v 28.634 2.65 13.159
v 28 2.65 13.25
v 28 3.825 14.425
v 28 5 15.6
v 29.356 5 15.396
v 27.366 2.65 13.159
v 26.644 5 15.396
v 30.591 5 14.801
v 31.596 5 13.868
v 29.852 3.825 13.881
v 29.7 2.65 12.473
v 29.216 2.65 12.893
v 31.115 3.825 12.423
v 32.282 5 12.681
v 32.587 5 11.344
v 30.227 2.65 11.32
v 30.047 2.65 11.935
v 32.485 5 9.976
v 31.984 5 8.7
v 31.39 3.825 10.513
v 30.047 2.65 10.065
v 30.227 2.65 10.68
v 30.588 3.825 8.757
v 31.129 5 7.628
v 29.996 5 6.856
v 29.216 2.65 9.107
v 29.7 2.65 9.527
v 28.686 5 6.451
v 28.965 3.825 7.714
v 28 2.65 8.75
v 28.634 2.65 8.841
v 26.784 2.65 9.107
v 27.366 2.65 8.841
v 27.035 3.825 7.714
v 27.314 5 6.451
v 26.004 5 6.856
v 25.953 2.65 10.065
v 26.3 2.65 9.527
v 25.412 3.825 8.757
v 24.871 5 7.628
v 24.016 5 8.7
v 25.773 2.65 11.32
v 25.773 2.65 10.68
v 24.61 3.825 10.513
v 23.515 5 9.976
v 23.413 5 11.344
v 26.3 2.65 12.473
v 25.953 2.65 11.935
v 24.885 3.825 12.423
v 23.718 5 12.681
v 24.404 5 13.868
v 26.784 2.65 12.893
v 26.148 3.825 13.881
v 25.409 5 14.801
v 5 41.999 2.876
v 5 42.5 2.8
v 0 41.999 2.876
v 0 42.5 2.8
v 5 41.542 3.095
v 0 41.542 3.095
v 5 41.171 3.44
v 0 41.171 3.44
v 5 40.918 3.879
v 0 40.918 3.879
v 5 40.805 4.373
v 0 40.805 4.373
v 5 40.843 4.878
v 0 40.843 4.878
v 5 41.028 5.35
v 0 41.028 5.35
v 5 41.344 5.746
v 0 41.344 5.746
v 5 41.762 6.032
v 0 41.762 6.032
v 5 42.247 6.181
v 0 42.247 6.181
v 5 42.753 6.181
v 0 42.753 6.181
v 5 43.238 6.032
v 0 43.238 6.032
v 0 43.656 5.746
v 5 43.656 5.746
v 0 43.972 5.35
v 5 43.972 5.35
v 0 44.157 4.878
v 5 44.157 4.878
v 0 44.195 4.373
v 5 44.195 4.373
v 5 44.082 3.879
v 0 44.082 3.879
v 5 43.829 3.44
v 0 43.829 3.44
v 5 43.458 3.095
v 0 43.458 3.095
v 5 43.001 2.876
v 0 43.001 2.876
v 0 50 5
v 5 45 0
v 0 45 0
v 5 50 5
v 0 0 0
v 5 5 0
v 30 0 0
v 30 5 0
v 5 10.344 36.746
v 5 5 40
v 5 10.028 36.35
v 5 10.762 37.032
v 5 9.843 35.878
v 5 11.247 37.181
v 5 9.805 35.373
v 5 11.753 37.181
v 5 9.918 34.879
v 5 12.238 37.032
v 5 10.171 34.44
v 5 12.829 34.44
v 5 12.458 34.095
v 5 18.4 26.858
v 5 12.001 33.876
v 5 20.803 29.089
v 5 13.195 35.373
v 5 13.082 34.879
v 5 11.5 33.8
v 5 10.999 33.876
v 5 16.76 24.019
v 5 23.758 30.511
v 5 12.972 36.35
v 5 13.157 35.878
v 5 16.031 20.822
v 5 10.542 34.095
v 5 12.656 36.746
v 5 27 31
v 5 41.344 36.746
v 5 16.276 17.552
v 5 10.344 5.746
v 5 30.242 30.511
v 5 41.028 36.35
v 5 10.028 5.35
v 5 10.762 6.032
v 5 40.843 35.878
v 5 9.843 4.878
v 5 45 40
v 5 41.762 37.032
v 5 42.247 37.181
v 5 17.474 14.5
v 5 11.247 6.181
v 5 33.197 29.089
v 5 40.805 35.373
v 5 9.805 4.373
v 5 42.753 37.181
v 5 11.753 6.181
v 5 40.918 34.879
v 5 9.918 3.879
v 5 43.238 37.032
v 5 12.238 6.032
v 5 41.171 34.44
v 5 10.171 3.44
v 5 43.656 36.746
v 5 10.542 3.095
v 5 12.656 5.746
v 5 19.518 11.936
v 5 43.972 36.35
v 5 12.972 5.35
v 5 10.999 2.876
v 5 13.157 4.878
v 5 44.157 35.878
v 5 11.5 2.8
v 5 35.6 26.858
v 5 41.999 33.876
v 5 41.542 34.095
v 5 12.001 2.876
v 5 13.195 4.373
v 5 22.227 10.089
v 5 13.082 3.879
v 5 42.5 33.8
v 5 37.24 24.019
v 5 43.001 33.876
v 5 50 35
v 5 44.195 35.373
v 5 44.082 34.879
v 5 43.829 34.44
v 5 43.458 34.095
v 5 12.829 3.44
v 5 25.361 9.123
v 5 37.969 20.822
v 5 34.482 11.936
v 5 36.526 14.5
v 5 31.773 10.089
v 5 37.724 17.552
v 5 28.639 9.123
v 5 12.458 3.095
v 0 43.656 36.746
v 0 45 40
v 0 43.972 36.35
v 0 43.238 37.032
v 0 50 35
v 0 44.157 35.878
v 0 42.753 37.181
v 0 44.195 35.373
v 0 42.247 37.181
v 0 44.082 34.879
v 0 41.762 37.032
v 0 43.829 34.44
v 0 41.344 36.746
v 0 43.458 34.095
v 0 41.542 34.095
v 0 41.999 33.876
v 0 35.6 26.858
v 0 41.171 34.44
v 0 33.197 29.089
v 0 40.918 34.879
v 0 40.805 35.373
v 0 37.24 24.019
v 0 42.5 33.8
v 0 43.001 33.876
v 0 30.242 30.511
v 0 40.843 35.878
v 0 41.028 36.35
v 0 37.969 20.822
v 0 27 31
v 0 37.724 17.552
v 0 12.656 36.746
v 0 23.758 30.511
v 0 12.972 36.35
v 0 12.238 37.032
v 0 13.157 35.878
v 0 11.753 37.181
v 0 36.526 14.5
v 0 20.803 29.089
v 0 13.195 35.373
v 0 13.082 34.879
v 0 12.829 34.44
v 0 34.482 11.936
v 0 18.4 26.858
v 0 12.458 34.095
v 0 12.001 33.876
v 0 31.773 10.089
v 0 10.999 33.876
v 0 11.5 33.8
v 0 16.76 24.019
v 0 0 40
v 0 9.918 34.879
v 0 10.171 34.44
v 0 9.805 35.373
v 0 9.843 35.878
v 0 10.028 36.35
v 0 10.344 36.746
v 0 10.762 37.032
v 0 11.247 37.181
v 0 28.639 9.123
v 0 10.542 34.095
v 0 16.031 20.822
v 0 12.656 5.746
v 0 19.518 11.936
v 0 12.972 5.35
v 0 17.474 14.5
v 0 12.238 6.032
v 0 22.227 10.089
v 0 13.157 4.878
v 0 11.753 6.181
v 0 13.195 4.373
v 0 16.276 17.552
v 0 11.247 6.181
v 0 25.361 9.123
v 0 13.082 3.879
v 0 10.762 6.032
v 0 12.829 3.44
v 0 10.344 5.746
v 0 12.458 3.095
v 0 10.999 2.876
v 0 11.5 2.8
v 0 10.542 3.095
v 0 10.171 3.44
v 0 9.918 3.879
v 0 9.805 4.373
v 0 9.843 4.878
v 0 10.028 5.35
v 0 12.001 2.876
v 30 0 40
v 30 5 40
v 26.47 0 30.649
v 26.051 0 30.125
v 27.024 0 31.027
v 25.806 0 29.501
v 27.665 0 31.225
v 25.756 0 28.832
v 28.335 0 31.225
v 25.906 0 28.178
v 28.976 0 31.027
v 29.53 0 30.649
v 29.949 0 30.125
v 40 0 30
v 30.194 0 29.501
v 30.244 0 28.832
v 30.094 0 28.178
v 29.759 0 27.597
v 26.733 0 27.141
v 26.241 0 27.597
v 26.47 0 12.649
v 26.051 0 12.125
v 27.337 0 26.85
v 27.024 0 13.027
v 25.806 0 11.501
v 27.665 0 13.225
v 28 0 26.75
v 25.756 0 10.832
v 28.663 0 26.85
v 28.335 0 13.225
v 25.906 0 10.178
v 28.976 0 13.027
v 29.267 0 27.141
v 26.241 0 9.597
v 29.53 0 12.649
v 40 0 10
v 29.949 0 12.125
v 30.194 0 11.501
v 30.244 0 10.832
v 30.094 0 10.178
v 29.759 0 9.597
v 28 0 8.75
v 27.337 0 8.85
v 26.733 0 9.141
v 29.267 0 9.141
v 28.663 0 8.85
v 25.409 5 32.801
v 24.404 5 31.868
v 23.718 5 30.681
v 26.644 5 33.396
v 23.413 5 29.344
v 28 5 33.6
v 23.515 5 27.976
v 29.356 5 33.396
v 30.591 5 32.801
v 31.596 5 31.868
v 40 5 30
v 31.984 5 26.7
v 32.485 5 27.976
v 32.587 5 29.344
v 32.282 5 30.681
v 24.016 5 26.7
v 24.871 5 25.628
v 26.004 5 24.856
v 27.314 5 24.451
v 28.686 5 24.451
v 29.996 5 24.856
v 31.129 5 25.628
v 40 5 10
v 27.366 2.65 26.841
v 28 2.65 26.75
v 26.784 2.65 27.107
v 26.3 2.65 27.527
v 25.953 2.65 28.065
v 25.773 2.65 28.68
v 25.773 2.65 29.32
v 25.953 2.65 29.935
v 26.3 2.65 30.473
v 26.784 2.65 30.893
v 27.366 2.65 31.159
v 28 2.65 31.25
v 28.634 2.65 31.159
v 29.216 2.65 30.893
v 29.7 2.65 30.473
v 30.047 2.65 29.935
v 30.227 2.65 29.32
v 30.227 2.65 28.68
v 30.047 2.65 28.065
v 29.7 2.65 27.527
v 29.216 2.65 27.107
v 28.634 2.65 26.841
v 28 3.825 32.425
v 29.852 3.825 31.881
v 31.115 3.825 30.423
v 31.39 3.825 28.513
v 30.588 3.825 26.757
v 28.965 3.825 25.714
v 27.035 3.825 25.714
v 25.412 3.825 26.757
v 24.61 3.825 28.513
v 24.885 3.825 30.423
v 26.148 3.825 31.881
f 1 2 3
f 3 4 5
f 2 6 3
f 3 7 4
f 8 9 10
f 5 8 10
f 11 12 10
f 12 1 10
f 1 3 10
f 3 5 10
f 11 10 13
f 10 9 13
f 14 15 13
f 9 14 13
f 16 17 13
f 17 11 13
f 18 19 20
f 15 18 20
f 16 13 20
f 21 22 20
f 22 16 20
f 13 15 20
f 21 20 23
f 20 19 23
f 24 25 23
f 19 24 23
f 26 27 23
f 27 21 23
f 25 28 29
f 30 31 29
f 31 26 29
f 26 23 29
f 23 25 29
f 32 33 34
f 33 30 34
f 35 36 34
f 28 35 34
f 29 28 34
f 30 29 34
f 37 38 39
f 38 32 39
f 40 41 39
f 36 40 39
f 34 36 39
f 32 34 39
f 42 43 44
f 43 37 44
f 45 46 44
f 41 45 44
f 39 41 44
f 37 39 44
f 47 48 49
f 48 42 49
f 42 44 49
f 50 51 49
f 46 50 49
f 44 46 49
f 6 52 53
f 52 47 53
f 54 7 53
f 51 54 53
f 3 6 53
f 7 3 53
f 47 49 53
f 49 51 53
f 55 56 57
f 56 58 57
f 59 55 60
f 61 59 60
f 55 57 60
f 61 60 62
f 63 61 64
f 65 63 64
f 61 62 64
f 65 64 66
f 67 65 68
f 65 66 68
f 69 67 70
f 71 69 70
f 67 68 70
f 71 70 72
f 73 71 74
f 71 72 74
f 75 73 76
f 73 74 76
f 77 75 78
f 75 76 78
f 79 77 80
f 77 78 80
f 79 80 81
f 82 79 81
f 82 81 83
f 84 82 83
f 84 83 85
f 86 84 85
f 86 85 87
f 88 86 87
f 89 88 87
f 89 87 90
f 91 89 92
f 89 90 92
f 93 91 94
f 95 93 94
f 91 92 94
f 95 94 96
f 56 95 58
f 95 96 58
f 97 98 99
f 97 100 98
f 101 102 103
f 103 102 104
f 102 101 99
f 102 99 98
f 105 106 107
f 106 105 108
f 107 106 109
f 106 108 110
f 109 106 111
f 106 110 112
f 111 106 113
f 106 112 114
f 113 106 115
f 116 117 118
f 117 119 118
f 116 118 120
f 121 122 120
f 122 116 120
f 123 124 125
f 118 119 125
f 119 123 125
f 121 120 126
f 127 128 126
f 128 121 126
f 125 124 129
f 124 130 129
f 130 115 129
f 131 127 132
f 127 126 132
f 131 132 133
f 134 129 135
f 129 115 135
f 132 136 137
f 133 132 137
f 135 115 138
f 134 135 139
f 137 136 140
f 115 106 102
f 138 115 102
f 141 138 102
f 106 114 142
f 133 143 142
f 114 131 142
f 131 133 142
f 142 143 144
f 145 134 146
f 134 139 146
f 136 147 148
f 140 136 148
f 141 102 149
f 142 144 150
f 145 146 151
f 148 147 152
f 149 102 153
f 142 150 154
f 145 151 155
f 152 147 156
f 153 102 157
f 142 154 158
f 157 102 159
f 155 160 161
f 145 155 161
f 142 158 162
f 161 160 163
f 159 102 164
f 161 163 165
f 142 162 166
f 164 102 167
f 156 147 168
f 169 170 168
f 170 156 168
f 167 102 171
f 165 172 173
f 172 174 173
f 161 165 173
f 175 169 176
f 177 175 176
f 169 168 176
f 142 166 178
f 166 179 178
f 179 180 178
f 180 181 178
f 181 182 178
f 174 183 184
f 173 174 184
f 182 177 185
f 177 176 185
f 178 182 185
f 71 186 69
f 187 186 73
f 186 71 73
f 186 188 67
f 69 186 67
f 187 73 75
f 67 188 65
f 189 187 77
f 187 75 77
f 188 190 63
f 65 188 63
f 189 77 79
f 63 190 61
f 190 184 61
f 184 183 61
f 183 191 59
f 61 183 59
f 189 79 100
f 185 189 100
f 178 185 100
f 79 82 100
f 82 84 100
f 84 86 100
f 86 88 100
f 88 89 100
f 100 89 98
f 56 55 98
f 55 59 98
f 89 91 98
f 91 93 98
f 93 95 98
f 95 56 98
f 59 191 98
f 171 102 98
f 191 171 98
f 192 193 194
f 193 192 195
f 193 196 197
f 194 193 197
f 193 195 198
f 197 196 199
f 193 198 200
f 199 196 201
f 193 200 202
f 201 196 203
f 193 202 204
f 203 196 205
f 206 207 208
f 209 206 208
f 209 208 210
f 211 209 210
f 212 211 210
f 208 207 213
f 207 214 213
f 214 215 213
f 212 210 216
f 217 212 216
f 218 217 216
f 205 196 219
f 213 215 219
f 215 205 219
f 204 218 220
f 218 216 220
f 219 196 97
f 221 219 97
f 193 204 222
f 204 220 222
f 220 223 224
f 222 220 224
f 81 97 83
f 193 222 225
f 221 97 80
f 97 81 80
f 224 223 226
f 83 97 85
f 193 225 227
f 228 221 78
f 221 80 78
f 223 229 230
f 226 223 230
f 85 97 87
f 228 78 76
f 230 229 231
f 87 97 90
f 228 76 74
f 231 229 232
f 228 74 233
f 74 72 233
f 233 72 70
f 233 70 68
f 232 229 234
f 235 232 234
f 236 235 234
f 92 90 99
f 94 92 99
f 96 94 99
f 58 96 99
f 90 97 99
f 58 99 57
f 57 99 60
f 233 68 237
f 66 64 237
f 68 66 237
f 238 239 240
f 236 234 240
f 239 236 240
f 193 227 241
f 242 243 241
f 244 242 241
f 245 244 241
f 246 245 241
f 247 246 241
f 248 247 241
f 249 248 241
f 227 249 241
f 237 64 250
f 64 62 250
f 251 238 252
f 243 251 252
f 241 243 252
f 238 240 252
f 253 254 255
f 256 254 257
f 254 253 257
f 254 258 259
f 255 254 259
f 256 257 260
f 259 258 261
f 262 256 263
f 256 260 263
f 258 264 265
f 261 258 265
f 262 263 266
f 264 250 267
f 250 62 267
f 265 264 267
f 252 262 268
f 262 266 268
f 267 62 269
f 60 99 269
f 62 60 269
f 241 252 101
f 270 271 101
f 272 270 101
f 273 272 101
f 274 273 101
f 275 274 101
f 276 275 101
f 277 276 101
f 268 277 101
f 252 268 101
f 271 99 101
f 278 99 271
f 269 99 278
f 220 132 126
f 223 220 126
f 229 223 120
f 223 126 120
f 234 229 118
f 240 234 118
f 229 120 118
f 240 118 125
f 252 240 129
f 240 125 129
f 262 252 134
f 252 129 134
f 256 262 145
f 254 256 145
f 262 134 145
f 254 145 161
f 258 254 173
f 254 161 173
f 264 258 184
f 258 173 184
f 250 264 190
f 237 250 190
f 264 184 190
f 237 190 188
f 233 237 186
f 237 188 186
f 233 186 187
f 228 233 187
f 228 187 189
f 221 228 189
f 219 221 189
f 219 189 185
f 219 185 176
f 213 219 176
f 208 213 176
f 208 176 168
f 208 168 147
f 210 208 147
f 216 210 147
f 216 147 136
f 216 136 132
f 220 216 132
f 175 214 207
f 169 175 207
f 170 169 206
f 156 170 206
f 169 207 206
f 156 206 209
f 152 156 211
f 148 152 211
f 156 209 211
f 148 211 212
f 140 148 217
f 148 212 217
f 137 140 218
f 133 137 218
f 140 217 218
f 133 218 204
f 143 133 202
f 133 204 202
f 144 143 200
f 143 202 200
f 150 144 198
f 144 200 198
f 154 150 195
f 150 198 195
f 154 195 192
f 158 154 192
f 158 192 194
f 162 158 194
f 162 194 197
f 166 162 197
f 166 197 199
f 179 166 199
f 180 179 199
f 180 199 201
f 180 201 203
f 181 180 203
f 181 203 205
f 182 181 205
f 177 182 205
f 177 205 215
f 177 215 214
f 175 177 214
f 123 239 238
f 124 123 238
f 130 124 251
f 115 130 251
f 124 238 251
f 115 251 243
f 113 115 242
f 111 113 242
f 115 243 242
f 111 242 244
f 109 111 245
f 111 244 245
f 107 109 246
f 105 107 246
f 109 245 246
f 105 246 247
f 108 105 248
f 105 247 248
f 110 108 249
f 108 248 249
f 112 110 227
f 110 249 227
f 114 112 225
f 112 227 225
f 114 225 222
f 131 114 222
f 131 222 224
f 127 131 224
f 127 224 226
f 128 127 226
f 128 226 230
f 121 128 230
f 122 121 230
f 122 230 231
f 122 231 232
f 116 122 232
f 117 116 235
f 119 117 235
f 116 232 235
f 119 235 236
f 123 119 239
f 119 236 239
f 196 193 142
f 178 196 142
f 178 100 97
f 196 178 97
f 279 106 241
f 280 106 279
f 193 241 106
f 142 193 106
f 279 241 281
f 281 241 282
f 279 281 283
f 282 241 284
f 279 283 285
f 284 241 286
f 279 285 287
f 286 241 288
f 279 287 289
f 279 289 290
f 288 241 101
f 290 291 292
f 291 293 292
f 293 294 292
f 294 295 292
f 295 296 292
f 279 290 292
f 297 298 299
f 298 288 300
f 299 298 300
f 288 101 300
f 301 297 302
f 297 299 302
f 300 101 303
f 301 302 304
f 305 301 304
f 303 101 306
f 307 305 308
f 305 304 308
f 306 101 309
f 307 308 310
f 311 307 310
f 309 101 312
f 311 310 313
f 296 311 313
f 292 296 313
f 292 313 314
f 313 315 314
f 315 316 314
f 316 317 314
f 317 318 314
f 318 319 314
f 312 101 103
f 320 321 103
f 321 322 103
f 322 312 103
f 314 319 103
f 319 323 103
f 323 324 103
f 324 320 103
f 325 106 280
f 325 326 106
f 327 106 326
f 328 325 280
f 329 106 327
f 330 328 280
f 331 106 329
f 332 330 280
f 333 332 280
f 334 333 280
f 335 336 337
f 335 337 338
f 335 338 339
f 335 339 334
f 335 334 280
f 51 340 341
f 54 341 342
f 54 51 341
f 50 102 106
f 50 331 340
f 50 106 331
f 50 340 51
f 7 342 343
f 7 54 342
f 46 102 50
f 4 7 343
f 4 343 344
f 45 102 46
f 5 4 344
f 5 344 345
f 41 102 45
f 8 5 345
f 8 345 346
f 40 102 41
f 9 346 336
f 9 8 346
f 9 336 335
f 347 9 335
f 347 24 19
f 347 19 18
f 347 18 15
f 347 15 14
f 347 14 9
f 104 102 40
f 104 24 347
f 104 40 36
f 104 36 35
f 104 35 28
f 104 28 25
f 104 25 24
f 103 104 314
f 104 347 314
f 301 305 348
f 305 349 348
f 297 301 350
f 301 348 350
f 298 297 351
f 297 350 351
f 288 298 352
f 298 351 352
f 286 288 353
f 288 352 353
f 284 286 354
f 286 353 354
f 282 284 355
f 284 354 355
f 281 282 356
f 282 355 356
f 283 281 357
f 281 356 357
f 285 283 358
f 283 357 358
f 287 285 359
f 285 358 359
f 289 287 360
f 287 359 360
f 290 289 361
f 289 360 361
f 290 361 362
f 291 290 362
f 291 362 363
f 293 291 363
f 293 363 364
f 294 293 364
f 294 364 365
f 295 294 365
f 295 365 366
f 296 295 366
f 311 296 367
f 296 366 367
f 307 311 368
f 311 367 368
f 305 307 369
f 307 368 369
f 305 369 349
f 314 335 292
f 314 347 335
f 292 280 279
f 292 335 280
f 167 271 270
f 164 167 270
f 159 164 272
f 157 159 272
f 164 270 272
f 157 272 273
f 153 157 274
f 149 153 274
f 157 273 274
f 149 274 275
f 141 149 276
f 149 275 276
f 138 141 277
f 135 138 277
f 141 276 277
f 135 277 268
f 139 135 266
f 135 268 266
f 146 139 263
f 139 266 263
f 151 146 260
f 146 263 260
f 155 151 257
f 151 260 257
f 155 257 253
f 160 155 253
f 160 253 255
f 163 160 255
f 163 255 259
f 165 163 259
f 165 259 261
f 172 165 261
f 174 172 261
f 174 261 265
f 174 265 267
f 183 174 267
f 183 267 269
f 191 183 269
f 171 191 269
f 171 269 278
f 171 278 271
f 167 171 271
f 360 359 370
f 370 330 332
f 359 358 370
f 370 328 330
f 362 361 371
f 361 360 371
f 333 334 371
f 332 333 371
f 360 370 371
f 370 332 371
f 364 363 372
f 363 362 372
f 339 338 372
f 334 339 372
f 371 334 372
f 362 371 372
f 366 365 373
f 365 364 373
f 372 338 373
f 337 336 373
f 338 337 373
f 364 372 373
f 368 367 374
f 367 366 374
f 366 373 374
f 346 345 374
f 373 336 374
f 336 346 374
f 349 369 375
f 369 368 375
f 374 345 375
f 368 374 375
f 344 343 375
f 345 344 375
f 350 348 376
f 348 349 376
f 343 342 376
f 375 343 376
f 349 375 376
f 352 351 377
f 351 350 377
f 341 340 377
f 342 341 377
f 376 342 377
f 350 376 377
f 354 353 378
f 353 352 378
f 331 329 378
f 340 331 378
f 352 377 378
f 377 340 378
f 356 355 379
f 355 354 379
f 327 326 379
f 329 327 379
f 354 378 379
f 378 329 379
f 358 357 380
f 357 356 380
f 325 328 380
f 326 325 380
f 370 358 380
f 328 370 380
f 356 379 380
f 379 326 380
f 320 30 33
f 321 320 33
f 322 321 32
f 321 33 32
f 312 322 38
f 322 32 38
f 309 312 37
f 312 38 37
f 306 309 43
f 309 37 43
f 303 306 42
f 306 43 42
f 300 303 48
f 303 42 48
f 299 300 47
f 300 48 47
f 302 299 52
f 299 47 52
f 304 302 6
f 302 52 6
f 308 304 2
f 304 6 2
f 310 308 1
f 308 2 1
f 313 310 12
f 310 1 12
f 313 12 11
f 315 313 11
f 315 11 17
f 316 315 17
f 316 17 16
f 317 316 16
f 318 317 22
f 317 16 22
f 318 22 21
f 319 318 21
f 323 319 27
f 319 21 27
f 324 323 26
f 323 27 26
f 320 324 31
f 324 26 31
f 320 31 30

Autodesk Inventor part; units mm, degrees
ref_plane "YZ Plane" through (0, 0, 0) normal (1, 0, 0) x (0, 1, 0)
ref_plane "XZ Plane" through (0, 0, 0) normal (0, 1, 0) x (-1, 0, 0)
ref_plane "XY Plane" through (0, 0, 0) normal (0, 0, 1) x (1, 0, 0)
sketch "Skizze1" plane through (0, 0, 0) normal (0, 0, 1) x (1, 0, 0)
  line L0 (0, 0) -> (40, 0)
  line L1 (5, 5) -> (5, 50)
  line L2 (5, 50) -> (0, 50)
  line L3 (0, 50) -> (0, 0)
  line L4 (5, 5) -> (40, 5)
  line L5 (40, 5) -> (40, 0)
  line L6 (-8, 0) -> (48, 0) projected
  line L7 (0, -10) -> (0, 60) projected
  dimension "d0" = 50
  dimension "d3" = 40
  dimension "d4" = 5
extrude "Extrusion1" add sketch "Skizze1" along normal blind 40
sketch "Skizze2" plane through (0, 0, 0) normal (-1, 0, 0) x (0, 0, 1)
  line L0 (0, 50) -> (40, 50) projected
  line L1 (0, 0) -> (40, 0) projected
  line L2 (20, 50) -> (20, 0)
  point P0 (20, 27)
  dimension "d7" = 27
hole "Bohrung1" at (0, 27, 20) direction (1, 0, 0) diameter 22 end through all
sketch "Skizze4" plane through (0, 0, 0) normal (0, -1, 0) x (1, 0, 0)
  line L0 (40, 40) -> (0, 40) projected
  line L1 (0, 0) -> (0, 40) projected
  line L2 (0, 0) -> (40, 0) projected
  line L3 (40, 0) -> (40, 40) projected
  line L4 (28, 40) -> (28, 0)
  line L5 (0, 20) -> (40, 20)
  point P0 (28, 29)
  point P1 (28, 11)
  dimension "d24" = 12
  dimension "d25" = 18
hole "Bohrung3" at (28, 0, 29) at (28, 0, 11) direction (0, 1, 0) diameter 4.5 end through all
hole "Bohrung4" at (28, 5, 29) direction (0, -1, 0) diameter 4.5 end through all countersink diameter 9.2 countersink angle 90
hole "Bohrung5" at (28, 5, 11) direction (0, -1, 0) diameter 4.5 end through all countersink diameter 9.2 countersink angle 90
chamfer "Fase1" distance 10 angle 45 2 edges at (40, 2.5, 0) (40, 2.5, 40)
sketch "Skizze6" plane through (5, 5, 0) normal (1, 0, 0) x (0, 0, -1)
  circle A0 centre (-20, 22) radius 11 projected
  line L0 (0, 45) -> (-40, 45) projected
  line L1 (-20, 22) -> (-5.2877, 22)
  line L2 (0, -15.2) -> (0, 56.2) projected
  line L3 (8, -5) -> (-48, -5) projected
  line L4 (-20, 22) -> (-20, 10.2851)
  line L5 (-35.5, 37.5) -> (-4.5, 37.5)
  line L6 (-4.5, 37.5) -> (-4.5, 6.5)
  line L7 (-4.5, 6.5) -> (-35.5, 6.5)
  line L8 (-35.5, 6.5) -> (-35.5, 37.5)
  point P0 (0, -5)
  dimension "d54" = 31
hole "Bohrung6" at (5, 42.5, 35.5) at (5, 42.5, 4.5) at (5, 11.5, 4.5) at (5, 11.5, 35.5) direction (-1, 0, 0) diameter 3.4 end through all
chamfer "Fase2" distance 5 angle 45 2 edges at (2.5, 50, 40) (2.5, 50, 0)
properties part number "13_0204_058"
